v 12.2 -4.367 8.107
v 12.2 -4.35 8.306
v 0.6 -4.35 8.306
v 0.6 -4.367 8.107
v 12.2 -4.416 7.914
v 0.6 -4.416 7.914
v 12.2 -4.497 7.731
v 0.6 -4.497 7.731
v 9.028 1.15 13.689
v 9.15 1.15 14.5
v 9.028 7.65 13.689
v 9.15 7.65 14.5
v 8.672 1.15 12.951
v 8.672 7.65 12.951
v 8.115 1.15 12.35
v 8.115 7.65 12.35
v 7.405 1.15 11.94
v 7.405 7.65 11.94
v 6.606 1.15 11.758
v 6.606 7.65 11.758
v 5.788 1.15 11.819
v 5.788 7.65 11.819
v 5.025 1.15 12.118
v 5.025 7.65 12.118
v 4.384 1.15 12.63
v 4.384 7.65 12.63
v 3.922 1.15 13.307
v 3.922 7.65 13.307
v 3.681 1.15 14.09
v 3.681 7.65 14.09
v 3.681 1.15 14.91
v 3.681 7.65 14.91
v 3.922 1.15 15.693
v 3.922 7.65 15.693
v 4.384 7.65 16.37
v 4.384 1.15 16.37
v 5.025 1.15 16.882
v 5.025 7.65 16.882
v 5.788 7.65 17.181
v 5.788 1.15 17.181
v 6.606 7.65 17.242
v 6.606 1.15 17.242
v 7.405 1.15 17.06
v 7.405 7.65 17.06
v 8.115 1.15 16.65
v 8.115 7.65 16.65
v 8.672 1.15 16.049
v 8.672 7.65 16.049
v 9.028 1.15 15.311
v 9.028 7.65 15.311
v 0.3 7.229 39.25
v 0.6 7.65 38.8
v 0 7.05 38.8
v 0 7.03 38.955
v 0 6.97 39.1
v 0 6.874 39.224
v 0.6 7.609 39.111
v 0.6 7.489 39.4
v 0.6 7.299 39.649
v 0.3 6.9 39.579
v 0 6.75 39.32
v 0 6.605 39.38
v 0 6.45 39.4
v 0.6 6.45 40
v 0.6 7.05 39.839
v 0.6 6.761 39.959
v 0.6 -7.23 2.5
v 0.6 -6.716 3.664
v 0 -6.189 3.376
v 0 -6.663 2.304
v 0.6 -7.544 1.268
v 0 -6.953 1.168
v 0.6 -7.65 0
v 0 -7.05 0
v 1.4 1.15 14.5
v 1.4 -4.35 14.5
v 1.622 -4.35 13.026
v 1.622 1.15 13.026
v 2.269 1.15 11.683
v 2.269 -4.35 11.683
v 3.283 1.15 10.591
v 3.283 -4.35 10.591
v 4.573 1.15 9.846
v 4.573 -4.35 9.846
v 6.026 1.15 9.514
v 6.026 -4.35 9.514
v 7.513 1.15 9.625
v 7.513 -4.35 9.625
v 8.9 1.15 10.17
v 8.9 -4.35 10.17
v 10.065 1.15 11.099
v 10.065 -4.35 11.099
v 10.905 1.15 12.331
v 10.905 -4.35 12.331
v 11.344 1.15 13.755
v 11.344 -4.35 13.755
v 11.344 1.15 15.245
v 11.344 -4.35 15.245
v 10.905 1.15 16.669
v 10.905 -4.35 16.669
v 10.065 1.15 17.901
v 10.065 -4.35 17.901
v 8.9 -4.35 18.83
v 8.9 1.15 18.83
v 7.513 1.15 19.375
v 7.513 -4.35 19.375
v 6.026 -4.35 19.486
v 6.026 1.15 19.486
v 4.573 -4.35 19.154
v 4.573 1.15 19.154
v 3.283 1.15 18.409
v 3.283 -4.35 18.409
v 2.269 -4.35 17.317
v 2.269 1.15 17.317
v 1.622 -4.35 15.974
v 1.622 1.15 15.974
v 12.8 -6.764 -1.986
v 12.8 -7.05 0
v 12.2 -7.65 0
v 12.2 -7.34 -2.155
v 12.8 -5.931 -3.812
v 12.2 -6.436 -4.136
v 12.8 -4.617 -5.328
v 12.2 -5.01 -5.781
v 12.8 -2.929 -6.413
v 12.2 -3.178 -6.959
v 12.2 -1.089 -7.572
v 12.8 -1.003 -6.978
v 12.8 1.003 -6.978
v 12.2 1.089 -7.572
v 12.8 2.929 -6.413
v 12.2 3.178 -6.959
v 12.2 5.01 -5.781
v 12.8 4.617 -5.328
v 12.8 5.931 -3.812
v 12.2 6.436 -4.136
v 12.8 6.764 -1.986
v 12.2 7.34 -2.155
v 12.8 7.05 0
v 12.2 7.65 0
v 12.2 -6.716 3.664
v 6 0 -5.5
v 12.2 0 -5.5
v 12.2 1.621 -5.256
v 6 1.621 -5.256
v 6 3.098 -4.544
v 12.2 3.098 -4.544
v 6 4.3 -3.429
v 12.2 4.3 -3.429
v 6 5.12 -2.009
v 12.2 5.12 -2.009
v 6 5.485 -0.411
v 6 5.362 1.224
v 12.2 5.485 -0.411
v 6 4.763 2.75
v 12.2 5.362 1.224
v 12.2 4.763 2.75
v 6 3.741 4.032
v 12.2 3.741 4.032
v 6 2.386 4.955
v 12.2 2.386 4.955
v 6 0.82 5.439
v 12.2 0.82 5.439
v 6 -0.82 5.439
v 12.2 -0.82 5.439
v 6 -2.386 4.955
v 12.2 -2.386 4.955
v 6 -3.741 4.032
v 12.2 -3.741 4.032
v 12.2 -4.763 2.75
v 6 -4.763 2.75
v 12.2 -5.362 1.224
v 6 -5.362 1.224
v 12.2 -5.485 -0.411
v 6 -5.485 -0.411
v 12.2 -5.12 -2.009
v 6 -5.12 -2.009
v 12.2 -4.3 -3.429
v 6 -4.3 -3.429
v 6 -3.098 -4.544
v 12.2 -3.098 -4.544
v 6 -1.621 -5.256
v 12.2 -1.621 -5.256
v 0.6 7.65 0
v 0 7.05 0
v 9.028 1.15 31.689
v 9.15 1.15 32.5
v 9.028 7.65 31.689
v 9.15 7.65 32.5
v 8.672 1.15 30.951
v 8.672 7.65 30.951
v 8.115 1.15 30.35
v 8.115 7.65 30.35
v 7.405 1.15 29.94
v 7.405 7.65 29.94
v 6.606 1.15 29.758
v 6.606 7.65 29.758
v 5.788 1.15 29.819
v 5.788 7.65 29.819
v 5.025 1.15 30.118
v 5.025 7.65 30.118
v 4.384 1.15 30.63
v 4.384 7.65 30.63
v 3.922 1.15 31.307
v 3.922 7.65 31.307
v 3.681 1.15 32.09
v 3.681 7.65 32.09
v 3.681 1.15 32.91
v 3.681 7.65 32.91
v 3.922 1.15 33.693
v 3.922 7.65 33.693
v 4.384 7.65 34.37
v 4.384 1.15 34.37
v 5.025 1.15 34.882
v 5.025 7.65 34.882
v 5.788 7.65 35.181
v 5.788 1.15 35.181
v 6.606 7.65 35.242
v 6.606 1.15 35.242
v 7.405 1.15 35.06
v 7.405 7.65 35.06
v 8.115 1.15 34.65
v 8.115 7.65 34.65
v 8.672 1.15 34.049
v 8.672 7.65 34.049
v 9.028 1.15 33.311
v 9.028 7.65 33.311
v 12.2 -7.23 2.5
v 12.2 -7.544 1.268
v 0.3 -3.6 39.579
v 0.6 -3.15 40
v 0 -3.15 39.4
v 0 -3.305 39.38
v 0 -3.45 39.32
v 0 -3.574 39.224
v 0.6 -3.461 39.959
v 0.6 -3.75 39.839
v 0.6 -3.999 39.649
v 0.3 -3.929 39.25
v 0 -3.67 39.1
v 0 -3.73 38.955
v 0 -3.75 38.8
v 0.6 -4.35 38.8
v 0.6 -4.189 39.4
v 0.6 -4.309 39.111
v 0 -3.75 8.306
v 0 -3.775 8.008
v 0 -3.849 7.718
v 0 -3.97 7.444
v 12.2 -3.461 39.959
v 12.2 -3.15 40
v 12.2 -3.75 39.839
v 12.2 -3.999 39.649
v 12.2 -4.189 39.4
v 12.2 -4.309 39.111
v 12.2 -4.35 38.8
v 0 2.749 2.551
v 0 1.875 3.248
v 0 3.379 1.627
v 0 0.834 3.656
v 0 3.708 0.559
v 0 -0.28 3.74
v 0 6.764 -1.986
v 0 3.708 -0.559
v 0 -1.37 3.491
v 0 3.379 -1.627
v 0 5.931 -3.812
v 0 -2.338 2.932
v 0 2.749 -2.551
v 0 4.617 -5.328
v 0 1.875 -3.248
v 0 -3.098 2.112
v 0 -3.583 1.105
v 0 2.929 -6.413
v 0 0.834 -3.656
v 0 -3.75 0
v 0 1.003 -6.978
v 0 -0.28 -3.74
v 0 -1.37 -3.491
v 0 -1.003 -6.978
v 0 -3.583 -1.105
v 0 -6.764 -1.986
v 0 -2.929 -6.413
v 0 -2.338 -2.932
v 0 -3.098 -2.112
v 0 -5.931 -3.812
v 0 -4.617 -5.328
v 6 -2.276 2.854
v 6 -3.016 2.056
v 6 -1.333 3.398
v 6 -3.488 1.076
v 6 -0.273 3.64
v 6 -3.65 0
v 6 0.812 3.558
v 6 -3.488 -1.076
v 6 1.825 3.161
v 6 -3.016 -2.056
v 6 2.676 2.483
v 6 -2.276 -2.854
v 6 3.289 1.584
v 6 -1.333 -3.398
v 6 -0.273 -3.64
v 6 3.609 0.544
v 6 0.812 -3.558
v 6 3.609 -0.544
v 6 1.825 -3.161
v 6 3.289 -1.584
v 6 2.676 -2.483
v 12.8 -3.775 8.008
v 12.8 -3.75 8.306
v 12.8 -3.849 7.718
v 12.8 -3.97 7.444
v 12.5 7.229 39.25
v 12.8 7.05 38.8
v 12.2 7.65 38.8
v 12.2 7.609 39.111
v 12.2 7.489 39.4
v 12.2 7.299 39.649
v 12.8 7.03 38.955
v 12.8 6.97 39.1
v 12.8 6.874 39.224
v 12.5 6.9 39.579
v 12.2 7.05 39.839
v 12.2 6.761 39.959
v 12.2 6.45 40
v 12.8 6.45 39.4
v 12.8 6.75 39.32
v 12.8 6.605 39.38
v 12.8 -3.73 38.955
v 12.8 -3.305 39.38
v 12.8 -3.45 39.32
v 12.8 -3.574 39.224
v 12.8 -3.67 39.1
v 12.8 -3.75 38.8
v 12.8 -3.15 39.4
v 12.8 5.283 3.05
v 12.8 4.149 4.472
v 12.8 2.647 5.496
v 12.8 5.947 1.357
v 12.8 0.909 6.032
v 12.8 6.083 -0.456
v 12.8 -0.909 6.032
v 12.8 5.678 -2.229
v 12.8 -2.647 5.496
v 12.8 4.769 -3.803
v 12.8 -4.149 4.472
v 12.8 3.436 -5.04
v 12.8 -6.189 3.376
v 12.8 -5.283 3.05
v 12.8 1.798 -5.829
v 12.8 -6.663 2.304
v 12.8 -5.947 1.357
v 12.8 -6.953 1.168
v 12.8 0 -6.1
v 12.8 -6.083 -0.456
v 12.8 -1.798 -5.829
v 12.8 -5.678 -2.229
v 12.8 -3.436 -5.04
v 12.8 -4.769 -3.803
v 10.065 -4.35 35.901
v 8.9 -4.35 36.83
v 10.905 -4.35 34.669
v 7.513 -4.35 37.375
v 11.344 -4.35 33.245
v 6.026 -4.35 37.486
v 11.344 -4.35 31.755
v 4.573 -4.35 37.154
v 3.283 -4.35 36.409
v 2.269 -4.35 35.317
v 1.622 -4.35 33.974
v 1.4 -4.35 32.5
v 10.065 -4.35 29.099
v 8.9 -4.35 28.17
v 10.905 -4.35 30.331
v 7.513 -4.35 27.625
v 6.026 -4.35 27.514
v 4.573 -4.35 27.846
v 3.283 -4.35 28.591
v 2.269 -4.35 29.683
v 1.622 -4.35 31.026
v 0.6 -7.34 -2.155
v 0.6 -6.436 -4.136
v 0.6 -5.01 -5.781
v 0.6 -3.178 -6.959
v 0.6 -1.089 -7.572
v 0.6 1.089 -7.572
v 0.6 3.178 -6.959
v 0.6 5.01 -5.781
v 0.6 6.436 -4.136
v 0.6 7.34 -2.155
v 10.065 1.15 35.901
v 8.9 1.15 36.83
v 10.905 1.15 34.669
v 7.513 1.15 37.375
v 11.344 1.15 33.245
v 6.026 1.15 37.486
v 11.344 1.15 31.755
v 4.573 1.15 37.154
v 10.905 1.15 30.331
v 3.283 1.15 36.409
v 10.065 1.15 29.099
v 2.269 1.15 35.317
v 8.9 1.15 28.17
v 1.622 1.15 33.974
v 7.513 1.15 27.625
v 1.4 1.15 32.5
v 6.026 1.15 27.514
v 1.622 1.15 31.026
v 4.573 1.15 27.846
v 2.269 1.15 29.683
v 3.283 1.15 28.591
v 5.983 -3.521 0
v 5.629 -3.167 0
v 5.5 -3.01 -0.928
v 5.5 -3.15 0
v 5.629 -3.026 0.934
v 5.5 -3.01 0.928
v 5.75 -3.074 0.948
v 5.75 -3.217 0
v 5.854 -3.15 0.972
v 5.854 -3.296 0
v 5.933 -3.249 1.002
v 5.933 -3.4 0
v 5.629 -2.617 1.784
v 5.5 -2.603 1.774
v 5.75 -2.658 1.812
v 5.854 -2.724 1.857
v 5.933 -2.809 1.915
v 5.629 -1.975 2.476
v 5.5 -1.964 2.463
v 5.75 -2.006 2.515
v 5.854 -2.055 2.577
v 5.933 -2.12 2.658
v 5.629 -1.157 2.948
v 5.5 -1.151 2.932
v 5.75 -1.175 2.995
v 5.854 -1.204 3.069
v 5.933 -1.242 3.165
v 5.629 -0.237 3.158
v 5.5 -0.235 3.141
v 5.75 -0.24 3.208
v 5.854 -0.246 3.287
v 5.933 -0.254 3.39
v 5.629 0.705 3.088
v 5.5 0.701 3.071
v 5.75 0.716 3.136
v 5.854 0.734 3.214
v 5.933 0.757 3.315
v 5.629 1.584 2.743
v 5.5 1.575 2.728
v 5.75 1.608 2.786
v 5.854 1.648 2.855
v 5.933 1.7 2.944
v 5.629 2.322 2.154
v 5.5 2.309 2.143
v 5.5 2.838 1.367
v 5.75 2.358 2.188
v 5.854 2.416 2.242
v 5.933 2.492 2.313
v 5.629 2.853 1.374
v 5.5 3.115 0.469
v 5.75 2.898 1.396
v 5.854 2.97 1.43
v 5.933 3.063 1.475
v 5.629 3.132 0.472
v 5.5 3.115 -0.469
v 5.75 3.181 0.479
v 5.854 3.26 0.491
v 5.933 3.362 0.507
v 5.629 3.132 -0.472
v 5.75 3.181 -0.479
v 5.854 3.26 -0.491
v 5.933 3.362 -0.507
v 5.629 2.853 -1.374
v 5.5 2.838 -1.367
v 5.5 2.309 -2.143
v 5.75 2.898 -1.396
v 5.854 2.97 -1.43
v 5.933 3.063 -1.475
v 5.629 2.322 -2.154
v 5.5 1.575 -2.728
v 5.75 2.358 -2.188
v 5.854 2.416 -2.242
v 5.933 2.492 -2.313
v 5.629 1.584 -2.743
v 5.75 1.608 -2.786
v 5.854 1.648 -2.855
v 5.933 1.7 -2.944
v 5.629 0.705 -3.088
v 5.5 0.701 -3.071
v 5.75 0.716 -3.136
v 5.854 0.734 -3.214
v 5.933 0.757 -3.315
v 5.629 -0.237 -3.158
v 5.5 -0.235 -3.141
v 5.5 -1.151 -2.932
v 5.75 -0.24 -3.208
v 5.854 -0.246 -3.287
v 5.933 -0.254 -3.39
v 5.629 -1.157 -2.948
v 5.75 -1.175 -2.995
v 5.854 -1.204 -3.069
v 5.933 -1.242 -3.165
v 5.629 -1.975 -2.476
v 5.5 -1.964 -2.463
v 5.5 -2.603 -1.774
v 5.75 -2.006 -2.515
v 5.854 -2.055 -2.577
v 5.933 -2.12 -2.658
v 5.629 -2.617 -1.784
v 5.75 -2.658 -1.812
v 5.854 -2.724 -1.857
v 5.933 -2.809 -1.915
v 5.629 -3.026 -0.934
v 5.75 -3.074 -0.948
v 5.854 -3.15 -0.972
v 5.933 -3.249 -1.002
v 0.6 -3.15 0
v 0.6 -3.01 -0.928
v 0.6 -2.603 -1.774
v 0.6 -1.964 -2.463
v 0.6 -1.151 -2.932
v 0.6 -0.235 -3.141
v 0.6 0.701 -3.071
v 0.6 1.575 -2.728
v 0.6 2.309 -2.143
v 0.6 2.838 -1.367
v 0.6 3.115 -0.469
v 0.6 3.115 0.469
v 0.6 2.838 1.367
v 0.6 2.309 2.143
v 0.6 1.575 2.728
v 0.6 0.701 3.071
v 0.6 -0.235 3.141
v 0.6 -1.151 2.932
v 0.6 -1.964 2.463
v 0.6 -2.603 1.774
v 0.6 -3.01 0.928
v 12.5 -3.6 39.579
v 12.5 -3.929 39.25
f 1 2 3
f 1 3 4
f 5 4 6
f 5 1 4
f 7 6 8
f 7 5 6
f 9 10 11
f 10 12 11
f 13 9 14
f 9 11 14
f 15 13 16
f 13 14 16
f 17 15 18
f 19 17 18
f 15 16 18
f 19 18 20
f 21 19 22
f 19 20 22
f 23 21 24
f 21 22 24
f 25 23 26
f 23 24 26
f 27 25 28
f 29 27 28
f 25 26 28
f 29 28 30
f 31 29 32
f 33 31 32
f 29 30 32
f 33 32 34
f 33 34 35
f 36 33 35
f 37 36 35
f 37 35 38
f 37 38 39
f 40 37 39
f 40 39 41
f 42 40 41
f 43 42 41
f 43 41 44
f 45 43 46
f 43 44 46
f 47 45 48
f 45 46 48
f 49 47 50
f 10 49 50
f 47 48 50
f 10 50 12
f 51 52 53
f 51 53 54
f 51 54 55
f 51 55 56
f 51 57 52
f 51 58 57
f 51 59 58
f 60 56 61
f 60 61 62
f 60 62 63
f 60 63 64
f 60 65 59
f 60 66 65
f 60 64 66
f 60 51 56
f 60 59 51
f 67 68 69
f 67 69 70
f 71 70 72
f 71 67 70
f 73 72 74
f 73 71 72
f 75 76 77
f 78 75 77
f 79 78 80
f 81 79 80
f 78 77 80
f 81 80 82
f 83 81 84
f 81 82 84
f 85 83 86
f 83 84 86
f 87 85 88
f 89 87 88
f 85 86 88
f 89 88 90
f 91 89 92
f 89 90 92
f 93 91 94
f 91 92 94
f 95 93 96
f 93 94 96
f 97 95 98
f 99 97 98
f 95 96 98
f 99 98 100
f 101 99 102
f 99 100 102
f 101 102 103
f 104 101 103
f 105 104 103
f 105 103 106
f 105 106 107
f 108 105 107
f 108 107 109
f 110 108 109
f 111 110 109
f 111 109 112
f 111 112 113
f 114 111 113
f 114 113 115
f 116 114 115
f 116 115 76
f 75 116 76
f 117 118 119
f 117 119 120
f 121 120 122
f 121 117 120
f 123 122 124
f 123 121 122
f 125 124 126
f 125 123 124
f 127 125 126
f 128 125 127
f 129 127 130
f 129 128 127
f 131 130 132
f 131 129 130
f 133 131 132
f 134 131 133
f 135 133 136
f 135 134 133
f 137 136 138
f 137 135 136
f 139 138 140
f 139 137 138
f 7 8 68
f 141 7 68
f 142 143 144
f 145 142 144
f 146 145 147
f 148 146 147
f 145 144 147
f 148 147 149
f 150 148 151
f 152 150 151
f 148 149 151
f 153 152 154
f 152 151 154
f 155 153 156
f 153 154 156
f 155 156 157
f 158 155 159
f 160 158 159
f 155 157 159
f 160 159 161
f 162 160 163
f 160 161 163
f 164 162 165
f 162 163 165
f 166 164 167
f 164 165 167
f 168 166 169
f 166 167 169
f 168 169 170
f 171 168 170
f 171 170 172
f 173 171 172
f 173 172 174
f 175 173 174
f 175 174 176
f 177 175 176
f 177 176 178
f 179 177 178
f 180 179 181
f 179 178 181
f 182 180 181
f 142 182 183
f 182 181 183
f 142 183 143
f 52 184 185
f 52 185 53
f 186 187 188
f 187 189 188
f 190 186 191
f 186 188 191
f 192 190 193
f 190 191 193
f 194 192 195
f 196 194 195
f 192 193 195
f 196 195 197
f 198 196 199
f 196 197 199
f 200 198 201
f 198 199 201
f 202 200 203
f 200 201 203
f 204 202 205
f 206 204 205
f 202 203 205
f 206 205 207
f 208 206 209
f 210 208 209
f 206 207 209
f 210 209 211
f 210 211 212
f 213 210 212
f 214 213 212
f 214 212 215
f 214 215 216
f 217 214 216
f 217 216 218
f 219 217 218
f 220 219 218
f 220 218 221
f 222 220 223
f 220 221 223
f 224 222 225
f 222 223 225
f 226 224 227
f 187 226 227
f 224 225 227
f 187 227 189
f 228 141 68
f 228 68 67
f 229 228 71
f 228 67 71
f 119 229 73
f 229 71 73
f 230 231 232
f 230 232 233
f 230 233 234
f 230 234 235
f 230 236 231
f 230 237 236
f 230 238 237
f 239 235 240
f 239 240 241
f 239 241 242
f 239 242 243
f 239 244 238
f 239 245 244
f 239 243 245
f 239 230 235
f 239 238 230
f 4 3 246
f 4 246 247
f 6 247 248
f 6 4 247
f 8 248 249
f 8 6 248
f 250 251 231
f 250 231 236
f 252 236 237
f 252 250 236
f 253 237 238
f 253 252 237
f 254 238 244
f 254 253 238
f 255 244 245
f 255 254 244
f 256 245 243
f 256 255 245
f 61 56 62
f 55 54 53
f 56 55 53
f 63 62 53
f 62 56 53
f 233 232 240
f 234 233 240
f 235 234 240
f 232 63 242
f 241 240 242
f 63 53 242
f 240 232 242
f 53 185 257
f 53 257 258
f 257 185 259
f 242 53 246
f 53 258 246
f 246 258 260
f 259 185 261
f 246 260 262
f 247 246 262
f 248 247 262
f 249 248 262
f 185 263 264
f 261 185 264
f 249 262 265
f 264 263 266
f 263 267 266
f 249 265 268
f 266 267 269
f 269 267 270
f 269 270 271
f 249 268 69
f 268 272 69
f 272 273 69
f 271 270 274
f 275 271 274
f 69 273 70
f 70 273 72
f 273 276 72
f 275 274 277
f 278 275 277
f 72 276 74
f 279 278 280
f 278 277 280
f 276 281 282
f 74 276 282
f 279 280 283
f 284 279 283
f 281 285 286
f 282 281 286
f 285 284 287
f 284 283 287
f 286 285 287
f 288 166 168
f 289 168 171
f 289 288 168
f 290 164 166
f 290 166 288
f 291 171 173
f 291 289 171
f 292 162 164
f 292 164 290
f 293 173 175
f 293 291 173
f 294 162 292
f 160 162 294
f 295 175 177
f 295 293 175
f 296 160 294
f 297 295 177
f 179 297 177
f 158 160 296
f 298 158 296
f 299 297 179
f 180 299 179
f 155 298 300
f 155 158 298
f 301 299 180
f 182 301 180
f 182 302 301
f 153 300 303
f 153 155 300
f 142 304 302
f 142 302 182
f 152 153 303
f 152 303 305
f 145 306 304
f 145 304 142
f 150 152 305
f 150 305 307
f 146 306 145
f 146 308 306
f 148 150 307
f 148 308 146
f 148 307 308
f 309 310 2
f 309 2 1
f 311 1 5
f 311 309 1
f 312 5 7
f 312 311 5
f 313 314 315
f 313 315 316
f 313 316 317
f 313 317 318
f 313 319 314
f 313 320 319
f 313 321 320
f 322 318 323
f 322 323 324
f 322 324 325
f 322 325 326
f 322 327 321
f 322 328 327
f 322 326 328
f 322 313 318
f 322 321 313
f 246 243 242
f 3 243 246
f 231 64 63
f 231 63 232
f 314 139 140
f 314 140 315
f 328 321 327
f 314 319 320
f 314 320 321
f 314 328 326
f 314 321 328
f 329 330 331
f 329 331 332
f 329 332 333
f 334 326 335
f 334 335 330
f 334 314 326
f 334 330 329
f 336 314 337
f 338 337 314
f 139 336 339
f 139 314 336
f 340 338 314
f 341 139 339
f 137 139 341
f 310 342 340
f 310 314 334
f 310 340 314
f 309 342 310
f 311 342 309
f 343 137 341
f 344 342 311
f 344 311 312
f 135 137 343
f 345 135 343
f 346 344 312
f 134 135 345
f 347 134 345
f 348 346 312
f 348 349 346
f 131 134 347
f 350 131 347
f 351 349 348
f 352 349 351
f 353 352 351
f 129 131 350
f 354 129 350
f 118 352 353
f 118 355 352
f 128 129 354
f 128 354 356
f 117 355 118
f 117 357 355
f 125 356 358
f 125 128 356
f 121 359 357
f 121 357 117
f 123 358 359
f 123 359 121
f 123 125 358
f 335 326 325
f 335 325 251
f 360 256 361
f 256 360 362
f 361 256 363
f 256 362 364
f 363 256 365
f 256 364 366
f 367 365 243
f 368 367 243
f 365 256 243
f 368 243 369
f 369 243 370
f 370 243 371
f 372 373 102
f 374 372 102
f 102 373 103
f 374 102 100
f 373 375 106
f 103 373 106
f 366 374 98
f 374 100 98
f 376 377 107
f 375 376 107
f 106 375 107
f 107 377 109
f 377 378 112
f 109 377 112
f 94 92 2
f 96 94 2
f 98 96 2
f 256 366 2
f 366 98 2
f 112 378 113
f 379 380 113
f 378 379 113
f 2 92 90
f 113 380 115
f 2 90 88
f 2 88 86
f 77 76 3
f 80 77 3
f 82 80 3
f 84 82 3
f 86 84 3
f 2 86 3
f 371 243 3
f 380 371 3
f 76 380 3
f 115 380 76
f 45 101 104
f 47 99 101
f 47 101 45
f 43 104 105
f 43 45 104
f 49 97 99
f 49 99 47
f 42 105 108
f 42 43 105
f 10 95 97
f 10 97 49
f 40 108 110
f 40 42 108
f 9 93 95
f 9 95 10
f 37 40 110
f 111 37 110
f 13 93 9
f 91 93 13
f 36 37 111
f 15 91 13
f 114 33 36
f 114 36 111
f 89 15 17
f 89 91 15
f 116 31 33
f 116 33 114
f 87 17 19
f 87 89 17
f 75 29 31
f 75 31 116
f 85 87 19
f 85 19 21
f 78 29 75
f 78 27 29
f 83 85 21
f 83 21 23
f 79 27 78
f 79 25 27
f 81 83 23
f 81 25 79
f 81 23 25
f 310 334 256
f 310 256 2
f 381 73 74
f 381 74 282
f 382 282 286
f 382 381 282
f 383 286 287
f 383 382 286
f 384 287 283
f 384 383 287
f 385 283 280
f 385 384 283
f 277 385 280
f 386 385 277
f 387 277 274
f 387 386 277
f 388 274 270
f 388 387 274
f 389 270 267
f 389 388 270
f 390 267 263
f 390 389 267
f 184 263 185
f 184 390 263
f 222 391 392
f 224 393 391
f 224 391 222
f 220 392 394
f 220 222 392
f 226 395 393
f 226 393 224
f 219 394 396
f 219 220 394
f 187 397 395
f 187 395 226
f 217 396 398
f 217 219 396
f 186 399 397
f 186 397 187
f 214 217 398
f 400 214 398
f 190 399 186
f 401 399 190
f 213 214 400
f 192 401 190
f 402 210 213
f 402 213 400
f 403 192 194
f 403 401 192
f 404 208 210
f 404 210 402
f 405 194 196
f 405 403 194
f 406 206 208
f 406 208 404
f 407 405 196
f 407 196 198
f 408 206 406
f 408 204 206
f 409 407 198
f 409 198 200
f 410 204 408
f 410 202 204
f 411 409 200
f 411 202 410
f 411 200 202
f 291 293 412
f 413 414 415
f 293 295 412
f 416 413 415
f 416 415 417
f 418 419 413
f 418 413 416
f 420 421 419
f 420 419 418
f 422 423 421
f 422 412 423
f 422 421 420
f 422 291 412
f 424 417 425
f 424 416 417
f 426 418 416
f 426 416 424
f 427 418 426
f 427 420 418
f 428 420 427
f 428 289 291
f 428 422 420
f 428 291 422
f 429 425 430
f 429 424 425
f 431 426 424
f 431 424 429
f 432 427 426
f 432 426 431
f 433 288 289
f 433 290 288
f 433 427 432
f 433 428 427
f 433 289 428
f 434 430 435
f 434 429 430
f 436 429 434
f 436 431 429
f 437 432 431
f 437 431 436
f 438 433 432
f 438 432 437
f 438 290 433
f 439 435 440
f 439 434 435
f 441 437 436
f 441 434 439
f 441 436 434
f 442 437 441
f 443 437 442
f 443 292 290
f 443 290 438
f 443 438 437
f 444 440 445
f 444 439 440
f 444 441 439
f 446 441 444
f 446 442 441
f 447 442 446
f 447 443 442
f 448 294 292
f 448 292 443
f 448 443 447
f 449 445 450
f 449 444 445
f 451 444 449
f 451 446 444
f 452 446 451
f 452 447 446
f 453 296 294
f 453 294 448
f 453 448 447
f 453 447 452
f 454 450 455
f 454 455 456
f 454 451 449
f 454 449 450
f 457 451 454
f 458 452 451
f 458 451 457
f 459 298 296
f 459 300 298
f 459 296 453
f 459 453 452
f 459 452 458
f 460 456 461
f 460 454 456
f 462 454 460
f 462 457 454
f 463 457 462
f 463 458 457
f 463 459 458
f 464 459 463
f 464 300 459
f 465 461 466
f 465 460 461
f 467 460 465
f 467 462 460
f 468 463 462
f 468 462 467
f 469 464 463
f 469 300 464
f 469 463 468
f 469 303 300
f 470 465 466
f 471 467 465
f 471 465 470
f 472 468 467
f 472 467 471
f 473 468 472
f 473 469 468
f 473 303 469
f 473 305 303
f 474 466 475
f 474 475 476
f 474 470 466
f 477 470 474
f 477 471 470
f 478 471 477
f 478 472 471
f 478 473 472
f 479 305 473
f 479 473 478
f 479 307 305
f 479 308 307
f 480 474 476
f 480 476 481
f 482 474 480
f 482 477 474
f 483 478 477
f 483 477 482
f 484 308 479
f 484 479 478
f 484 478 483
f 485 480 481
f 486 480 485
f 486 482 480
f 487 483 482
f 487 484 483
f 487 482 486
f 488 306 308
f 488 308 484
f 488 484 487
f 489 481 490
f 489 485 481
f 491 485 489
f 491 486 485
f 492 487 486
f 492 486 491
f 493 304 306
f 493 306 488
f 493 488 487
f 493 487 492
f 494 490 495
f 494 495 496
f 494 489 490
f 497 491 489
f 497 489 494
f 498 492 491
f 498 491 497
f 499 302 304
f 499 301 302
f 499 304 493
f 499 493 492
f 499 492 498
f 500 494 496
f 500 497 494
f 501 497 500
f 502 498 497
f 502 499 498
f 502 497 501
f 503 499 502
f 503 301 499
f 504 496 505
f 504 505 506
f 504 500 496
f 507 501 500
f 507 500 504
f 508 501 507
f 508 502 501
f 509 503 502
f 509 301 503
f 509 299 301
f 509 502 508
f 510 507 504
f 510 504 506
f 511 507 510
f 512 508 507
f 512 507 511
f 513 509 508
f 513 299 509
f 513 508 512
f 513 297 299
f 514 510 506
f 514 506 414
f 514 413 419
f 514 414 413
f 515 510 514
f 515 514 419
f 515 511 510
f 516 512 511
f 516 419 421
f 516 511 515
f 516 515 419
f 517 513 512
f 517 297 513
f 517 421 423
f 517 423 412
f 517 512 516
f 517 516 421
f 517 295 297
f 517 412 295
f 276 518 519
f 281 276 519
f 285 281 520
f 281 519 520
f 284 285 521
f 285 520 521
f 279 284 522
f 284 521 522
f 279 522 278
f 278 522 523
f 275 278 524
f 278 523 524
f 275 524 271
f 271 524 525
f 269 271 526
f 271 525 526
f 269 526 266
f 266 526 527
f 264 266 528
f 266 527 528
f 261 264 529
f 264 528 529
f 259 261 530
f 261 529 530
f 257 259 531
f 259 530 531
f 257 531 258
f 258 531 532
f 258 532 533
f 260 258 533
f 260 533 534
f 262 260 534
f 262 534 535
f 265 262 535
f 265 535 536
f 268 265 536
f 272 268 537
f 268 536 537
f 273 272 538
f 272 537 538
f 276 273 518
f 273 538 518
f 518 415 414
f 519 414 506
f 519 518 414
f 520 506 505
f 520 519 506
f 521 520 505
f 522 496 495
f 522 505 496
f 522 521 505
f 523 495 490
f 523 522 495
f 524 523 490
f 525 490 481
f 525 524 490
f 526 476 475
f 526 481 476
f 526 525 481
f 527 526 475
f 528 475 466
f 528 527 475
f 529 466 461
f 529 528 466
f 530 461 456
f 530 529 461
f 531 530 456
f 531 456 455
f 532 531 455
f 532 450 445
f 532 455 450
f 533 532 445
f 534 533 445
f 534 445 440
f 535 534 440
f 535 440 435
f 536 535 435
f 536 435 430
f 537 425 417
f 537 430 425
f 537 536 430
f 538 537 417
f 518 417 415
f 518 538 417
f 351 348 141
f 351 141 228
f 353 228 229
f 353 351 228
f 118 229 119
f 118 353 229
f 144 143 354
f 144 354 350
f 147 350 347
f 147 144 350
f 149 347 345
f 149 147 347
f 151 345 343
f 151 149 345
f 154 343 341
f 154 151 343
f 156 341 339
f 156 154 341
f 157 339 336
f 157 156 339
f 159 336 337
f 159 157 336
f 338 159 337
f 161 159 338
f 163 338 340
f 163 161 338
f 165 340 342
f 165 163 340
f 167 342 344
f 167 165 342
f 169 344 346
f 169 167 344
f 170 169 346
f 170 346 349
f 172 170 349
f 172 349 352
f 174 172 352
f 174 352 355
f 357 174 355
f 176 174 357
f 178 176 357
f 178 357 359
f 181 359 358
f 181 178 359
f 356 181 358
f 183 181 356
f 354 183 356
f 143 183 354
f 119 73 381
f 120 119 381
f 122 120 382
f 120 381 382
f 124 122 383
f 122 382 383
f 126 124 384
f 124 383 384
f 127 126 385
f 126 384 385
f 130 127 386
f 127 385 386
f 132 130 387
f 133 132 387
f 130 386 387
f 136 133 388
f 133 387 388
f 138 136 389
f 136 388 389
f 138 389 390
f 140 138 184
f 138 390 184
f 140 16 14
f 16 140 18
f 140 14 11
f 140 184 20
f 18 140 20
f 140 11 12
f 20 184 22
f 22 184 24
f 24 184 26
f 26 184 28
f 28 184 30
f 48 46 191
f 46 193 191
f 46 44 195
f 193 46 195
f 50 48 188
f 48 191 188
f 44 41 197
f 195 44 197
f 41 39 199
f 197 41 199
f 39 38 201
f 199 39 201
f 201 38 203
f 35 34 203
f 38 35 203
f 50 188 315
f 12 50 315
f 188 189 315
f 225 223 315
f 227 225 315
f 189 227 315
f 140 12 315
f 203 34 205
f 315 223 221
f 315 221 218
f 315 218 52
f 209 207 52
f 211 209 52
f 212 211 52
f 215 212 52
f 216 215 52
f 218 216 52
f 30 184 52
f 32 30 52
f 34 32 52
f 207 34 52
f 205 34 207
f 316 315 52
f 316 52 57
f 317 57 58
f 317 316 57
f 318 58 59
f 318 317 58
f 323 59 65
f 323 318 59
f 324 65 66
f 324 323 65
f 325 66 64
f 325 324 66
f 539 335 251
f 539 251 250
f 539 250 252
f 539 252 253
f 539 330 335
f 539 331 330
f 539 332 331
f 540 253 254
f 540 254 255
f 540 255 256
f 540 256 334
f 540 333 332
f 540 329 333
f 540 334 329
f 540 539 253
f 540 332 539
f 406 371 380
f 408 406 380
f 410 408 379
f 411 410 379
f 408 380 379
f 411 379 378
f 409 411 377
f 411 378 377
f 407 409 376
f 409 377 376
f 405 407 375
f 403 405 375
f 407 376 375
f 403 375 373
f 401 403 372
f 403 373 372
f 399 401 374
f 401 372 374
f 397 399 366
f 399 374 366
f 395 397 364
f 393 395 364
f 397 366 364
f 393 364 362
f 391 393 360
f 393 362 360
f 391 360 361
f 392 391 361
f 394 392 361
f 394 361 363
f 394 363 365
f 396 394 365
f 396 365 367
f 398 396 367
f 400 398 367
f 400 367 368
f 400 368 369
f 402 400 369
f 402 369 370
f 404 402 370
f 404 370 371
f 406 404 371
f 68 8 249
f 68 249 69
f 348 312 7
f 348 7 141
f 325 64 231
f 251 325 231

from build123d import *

# Parameters (mm, degrees)
SKETCH5_R                               = 3.15
BOSS_EXTRUDE5_DEPTH                     = 12.8
CBORE_FOR_M5_HEX_HEAD_BOLT1_D           = 5.5
CBORE_FOR_M5_HEX_HEAD_BOLT1_CBORE_D     = 10
CBORE_FOR_M5_HEX_HEAD_BOLT1_CBORE_DEPTH = 5.5
SKETCH8_R                               = 5.5
CUT_EXTRUDE_LEFT_DEPTH                  = 6.8
FILLET5_R                               = 1.2
CHAMFER2_SIZE                           = 0.6
FILLET7_R                               = 0.5


with BuildPart() as part:
    # Sketch5 → Boss-Extrude5 (new body)
    with BuildSketch(Plane(origin=(0, 0, 0), x_dir=(0, -1, 0), z_dir=(1, 0, 0))):
        with BuildLine():
            Line((-7.65, 0), (-7.65, -40))
            Line((-7.65, -40), (4.35, -40))
            Line((4.35, -40), (4.35, -8))
            Line((4.35, -8), (6.715651055, -3.663677239))
            ThreePointArc((6.715651055, -3.663677239), (7.412733321, -1.890472088), (7.65, 0))
            ThreePointArc((7.65, 0), (0, 7.65), (-7.65, 0))
        make_face()
        Circle(SKETCH5_R, mode=Mode.SUBTRACT)
    extrude(amount=BOSS_EXTRUDE5_DEPTH)

    # CBORE for M5 Hex Head Bolt1 (through all)
    with Locations(Plane(origin=(0, -4.35, 0), x_dir=(-1, 0, 0), z_dir=(0, -1, 0))):
        with Locations((-6.4, -14.5), (-6.4, -32.5)):
            CounterBoreHole(CBORE_FOR_M5_HEX_HEAD_BOLT1_D / 2, CBORE_FOR_M5_HEX_HEAD_BOLT1_CBORE_D / 2, CBORE_FOR_M5_HEX_HEAD_BOLT1_CBORE_DEPTH)

    # Sketch8 → Cut-Extrude-LEFT (cut)
    with BuildSketch(Plane(origin=(12.8, 0, 0), x_dir=(0, 0, -1), z_dir=(1, 0, 0))):
        Circle(SKETCH8_R)
    extrude(amount=-CUT_EXTRUDE_LEFT_DEPTH, mode=Mode.SUBTRACT)

    # Fillet5
    fillet5_edges = [part.edges().sort_by_distance(p)[0] for p in [
        (6.4, -4.35, 40),
        (6.4, 7.65, 40),
        (6.4, -4.35, 8),
    ]]
    fillet(fillet5_edges, radius=FILLET5_R)

    # Chamfer2
    chamfer2_edges = [part.edges().sort_by_distance(p)[0] for p in [
        (12.8, -1.890472088, -7.412733321),
        (0, 3.15, 0),
        (12.8, 7.65, 19.4),
        (12.8, 0, 5.5),
        (0, -5.606107798, 5.697509604),
        (12.8, -5.606107798, 5.697509604),
        (0, -4.35, 23.553018219),
        (12.8, -4.35, 23.553018219),
        (0, 1.65, 40),
        (12.8, 1.65, 40),
        (0, -3.998528137, 39.648528137),
        (0, 7.298528137, 39.648528137),
        (12.8, -3.998528137, 39.648528137),
        (12.8, 7.298528137, 39.648528137),
        (0, -4.387218303, 8.009491797),
        (12.8, -4.387218303, 8.009491797),
        (0, 7.65, 19.4),
        (0, -1.890472088, -7.412733321),
    ]]
    chamfer(chamfer2_edges, length=CHAMFER2_SIZE)

    # Fillet7
    fillet7_edges = [part.edges().sort_by_distance(p)[0] for p in [
        (6, 3.15, 0),
    ]]
    fillet(fillet7_edges, radius=FILLET7_R)


solid = part.part
